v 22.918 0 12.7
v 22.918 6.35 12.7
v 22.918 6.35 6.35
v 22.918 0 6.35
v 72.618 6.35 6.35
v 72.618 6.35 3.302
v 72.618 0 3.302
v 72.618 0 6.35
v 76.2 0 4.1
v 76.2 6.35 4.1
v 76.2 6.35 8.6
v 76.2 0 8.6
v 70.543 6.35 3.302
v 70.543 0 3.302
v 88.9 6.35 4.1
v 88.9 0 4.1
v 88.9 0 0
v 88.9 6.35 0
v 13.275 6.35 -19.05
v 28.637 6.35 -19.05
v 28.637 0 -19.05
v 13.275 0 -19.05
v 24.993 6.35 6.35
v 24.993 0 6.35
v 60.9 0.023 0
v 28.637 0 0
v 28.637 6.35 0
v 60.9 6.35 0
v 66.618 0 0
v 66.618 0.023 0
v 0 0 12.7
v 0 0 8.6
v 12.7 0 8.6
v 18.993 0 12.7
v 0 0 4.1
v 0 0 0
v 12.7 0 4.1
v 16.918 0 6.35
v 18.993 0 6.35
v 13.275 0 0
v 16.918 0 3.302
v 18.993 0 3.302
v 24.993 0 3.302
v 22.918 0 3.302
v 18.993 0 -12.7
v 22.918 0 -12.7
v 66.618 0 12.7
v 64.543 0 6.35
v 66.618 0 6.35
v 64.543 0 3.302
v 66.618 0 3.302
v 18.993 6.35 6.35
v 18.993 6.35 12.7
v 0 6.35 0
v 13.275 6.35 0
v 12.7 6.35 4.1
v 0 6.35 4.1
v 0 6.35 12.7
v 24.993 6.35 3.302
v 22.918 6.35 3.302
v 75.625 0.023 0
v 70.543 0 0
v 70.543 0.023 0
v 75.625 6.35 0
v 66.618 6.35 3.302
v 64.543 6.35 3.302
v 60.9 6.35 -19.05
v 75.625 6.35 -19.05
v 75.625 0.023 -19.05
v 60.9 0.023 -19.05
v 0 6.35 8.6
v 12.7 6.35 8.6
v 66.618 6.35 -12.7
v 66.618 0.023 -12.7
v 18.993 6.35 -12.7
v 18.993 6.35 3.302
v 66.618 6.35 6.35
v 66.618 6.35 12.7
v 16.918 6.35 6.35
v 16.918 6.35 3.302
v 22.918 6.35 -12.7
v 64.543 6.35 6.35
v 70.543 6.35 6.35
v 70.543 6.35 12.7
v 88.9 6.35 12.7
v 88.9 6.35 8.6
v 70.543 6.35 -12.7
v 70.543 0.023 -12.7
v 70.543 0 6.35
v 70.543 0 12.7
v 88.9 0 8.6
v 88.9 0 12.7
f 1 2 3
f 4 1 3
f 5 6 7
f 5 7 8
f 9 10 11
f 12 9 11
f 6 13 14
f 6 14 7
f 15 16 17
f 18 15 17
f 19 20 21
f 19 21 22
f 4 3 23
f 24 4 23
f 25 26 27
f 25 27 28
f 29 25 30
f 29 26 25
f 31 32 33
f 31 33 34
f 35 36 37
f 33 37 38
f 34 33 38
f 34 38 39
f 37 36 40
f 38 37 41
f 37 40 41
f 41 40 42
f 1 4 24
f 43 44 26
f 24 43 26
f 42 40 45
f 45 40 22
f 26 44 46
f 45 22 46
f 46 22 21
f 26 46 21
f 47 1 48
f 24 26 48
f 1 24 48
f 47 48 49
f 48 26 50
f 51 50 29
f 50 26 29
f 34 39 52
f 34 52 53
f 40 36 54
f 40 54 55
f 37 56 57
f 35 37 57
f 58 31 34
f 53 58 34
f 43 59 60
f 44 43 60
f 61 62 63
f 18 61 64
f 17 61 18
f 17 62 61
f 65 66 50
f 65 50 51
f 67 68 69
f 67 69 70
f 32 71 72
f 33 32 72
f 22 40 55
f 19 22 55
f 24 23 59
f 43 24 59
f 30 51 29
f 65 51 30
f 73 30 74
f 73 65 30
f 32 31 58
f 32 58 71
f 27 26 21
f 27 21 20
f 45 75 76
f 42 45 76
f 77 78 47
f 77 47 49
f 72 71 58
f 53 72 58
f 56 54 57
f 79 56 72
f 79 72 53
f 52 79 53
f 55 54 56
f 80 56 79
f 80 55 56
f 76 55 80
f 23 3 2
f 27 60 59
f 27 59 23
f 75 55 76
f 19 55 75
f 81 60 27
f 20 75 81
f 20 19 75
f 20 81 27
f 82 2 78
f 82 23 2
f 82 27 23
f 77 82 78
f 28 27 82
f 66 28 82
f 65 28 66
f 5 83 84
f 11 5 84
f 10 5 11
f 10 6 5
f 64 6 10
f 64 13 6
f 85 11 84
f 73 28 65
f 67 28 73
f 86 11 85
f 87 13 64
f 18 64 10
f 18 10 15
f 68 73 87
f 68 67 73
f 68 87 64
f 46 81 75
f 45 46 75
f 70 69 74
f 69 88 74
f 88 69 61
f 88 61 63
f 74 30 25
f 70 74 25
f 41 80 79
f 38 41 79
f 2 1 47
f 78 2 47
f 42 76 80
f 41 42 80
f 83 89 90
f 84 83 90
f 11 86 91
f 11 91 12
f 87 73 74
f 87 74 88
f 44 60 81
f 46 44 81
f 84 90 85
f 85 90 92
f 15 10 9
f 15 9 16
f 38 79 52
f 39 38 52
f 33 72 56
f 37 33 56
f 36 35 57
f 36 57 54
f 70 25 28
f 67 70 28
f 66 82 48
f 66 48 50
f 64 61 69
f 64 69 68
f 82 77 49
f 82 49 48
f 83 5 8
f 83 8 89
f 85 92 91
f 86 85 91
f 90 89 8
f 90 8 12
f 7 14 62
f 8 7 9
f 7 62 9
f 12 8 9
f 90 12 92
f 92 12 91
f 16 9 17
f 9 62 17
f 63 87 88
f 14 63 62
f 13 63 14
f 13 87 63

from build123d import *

# Parameters (mm, degrees)
SKETCH1_W           = 88.9
SKETCH1_H           = 12.7
BOSS_EXTRUDE1_DEPTH = 6.35
SKETCH2_W           = 14.725
SKETCH2_H           = 6.326510552
SKETCH2_W_2         = 15.361563021
SKETCH2_H_2         = 6.35
BOSS_EXTRUDE2_DEPTH = 19.05
CUT_EXTRUDE1_DEPTH  = 7.35
CUT_EXTRUDE2_DEPTH  = 7.35


with BuildPart() as part:
    # Sketch1 → Boss-Extrude1 (new body)
    with BuildSketch(Plane(origin=(0, 0, 0), x_dir=(1, 0, 0), z_dir=(0, 1, 0))):
        with Locations((44.45, -6.35)):
            Rectangle(SKETCH1_W, SKETCH1_H)
    extrude(amount=BOSS_EXTRUDE1_DEPTH)

    # Sketch2 → Boss-Extrude2 (add)
    with BuildSketch(Plane(origin=(0, 0, 0), x_dir=(-1, 0, 0), z_dir=(0, 0, -1))):
        with Locations((-68.2625, 3.186744724)):
            Rectangle(SKETCH2_W, SKETCH2_H)
        with Locations((-20.95578151, 3.175)):
            Rectangle(SKETCH2_W_2, SKETCH2_H_2)
    extrude(amount=BOSS_EXTRUDE2_DEPTH)

    # Sketch3 → Cut-Extrude1 (cut, through all)
    with BuildSketch(Plane(origin=(0, 6.35, 0), x_dir=(1, 0, 0), z_dir=(0, 1, 0))):
        Polygon((12.7, -6.35), (12.7, -4.1), (0, -4.1), (0, -8.6), (12.7, -8.6), align=None)
        Polygon((76.2, -6.35), (76.2, -4.1), (88.9, -4.1), (88.9, -8.6), (76.2, -8.6), align=None)
    extrude(amount=-CUT_EXTRUDE1_DEPTH, mode=Mode.SUBTRACT)

    # Sketch4 → Cut-Extrude2 (cut, through all)
    with BuildSketch(Plane(origin=(0, 6.35, 0), x_dir=(1, 0, 0), z_dir=(0, 1, 0))):
        Polygon((20.95578151, -12.7), (22.91828151, -12.7), (22.91828151, -6.35), (24.99328151, -6.35), (24.99328151, -3.302), (22.91828151, -3.302), (22.91828151, 12.7), (18.99328151, 12.7), (18.99328151, -3.302), (16.91828151, -3.302), (16.91828151, -6.35), (18.99328151, -6.35), (18.99328151, -12.7), align=None)
        Polygon((70.54328151, 12.7), (70.54328151, -3.302), (72.61828151, -3.302), (72.61828151, -6.35), (70.54328151, -6.35), (70.54328151, -12.7), (68.58078151, -12.7), (66.61828151, -12.7), (66.61828151, -6.35), (64.54328151, -6.35), (64.54328151, -3.302), (66.61828151, -3.302), (66.61828151, 12.7), align=None)
    extrude(amount=-CUT_EXTRUDE2_DEPTH, mode=Mode.SUBTRACT)


solid = part.part
